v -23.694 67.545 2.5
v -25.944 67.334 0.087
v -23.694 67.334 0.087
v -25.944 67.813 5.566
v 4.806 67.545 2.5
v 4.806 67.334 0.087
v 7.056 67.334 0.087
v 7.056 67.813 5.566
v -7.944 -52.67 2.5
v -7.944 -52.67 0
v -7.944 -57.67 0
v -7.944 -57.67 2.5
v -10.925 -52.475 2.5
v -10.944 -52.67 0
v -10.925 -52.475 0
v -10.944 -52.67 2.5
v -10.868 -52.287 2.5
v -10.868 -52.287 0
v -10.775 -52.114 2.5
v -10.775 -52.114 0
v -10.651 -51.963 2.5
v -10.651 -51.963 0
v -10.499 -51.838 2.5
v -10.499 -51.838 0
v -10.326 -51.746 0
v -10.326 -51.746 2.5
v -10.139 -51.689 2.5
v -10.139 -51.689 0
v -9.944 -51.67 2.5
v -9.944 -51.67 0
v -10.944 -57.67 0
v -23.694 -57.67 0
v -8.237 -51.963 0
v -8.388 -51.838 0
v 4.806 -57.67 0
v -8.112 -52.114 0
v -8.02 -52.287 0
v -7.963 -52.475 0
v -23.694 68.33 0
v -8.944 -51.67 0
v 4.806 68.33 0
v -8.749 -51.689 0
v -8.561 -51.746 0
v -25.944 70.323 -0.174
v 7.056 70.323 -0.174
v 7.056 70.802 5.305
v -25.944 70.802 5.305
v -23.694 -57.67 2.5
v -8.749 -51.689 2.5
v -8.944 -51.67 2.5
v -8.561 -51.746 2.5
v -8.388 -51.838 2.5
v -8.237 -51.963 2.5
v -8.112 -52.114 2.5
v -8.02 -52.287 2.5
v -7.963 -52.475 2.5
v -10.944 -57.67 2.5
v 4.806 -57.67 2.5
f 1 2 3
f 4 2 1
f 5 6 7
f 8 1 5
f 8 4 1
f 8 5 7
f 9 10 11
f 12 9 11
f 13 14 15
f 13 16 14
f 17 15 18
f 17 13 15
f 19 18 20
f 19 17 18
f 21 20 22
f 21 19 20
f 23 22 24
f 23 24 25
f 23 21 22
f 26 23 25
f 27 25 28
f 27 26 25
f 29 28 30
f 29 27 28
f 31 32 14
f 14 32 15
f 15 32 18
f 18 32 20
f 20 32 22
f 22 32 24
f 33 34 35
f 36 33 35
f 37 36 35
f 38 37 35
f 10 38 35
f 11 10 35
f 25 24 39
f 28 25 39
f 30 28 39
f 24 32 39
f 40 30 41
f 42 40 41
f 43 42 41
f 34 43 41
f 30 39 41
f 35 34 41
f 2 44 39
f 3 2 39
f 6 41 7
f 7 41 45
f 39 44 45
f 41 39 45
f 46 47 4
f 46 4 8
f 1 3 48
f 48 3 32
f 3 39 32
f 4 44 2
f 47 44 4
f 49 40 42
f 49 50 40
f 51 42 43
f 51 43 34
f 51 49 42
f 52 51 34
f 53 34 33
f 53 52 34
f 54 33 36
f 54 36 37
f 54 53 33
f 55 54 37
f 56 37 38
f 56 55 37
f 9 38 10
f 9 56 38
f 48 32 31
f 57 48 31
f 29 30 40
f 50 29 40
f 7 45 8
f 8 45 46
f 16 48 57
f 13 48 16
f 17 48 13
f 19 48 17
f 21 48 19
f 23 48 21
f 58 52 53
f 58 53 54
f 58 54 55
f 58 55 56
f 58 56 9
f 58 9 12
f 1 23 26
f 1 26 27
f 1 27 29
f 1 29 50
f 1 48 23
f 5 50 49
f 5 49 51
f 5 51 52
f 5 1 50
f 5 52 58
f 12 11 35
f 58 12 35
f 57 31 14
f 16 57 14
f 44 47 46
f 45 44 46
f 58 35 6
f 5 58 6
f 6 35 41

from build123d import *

# Parameters (mm, degrees)
F1_DEPTH      = 2.5
F2_R          = 1
F4_W          = 33
F4_H          = 5.5
F5_DEPTH      = 2
F5_DEPTH_BACK = 1


with BuildPart() as f1:
    # F0 (on Top) → F1 (new body)
    with BuildSketch(Plane.XY):
        Polygon((-23.6938069443, 68.3301911354), (-23.6938069443, -57.6698088646), (-10.9438069443, -57.6698088646), (-10.9438069443, -51.6698088646), (-7.9438069443, -51.6698088646), (-7.9438069443, -57.6698088646), (4.8061930557, -57.6698088646), (4.8061930557, 68.3301911354), align=None)
    extrude(amount=F1_DEPTH)

    # F2
    f2_edges = [f1.edges().sort_by_distance(p)[0] for p in [
        (-10.943807, -51.669809, 1.25),
        (-7.943807, -51.669809, 1.25),
    ]]
    fillet(f2_edges, radius=F2_R)

    # F4 (on face) → F5 (join, two sides)
    with BuildSketch(Plane(origin=(0, 67.8111465652, -5.9327065851), x_dir=(1, 0, 0), z_dir=(0, -0.9961946981, 0.0871557427))) as f5_sk:
        with Locations((-9.4438069443, 8.7053685605)):
            Rectangle(F4_W, F4_H)
    extrude(amount=-F5_DEPTH)
    extrude(f5_sk.sketch, amount=F5_DEPTH_BACK)


solid = f1.part
